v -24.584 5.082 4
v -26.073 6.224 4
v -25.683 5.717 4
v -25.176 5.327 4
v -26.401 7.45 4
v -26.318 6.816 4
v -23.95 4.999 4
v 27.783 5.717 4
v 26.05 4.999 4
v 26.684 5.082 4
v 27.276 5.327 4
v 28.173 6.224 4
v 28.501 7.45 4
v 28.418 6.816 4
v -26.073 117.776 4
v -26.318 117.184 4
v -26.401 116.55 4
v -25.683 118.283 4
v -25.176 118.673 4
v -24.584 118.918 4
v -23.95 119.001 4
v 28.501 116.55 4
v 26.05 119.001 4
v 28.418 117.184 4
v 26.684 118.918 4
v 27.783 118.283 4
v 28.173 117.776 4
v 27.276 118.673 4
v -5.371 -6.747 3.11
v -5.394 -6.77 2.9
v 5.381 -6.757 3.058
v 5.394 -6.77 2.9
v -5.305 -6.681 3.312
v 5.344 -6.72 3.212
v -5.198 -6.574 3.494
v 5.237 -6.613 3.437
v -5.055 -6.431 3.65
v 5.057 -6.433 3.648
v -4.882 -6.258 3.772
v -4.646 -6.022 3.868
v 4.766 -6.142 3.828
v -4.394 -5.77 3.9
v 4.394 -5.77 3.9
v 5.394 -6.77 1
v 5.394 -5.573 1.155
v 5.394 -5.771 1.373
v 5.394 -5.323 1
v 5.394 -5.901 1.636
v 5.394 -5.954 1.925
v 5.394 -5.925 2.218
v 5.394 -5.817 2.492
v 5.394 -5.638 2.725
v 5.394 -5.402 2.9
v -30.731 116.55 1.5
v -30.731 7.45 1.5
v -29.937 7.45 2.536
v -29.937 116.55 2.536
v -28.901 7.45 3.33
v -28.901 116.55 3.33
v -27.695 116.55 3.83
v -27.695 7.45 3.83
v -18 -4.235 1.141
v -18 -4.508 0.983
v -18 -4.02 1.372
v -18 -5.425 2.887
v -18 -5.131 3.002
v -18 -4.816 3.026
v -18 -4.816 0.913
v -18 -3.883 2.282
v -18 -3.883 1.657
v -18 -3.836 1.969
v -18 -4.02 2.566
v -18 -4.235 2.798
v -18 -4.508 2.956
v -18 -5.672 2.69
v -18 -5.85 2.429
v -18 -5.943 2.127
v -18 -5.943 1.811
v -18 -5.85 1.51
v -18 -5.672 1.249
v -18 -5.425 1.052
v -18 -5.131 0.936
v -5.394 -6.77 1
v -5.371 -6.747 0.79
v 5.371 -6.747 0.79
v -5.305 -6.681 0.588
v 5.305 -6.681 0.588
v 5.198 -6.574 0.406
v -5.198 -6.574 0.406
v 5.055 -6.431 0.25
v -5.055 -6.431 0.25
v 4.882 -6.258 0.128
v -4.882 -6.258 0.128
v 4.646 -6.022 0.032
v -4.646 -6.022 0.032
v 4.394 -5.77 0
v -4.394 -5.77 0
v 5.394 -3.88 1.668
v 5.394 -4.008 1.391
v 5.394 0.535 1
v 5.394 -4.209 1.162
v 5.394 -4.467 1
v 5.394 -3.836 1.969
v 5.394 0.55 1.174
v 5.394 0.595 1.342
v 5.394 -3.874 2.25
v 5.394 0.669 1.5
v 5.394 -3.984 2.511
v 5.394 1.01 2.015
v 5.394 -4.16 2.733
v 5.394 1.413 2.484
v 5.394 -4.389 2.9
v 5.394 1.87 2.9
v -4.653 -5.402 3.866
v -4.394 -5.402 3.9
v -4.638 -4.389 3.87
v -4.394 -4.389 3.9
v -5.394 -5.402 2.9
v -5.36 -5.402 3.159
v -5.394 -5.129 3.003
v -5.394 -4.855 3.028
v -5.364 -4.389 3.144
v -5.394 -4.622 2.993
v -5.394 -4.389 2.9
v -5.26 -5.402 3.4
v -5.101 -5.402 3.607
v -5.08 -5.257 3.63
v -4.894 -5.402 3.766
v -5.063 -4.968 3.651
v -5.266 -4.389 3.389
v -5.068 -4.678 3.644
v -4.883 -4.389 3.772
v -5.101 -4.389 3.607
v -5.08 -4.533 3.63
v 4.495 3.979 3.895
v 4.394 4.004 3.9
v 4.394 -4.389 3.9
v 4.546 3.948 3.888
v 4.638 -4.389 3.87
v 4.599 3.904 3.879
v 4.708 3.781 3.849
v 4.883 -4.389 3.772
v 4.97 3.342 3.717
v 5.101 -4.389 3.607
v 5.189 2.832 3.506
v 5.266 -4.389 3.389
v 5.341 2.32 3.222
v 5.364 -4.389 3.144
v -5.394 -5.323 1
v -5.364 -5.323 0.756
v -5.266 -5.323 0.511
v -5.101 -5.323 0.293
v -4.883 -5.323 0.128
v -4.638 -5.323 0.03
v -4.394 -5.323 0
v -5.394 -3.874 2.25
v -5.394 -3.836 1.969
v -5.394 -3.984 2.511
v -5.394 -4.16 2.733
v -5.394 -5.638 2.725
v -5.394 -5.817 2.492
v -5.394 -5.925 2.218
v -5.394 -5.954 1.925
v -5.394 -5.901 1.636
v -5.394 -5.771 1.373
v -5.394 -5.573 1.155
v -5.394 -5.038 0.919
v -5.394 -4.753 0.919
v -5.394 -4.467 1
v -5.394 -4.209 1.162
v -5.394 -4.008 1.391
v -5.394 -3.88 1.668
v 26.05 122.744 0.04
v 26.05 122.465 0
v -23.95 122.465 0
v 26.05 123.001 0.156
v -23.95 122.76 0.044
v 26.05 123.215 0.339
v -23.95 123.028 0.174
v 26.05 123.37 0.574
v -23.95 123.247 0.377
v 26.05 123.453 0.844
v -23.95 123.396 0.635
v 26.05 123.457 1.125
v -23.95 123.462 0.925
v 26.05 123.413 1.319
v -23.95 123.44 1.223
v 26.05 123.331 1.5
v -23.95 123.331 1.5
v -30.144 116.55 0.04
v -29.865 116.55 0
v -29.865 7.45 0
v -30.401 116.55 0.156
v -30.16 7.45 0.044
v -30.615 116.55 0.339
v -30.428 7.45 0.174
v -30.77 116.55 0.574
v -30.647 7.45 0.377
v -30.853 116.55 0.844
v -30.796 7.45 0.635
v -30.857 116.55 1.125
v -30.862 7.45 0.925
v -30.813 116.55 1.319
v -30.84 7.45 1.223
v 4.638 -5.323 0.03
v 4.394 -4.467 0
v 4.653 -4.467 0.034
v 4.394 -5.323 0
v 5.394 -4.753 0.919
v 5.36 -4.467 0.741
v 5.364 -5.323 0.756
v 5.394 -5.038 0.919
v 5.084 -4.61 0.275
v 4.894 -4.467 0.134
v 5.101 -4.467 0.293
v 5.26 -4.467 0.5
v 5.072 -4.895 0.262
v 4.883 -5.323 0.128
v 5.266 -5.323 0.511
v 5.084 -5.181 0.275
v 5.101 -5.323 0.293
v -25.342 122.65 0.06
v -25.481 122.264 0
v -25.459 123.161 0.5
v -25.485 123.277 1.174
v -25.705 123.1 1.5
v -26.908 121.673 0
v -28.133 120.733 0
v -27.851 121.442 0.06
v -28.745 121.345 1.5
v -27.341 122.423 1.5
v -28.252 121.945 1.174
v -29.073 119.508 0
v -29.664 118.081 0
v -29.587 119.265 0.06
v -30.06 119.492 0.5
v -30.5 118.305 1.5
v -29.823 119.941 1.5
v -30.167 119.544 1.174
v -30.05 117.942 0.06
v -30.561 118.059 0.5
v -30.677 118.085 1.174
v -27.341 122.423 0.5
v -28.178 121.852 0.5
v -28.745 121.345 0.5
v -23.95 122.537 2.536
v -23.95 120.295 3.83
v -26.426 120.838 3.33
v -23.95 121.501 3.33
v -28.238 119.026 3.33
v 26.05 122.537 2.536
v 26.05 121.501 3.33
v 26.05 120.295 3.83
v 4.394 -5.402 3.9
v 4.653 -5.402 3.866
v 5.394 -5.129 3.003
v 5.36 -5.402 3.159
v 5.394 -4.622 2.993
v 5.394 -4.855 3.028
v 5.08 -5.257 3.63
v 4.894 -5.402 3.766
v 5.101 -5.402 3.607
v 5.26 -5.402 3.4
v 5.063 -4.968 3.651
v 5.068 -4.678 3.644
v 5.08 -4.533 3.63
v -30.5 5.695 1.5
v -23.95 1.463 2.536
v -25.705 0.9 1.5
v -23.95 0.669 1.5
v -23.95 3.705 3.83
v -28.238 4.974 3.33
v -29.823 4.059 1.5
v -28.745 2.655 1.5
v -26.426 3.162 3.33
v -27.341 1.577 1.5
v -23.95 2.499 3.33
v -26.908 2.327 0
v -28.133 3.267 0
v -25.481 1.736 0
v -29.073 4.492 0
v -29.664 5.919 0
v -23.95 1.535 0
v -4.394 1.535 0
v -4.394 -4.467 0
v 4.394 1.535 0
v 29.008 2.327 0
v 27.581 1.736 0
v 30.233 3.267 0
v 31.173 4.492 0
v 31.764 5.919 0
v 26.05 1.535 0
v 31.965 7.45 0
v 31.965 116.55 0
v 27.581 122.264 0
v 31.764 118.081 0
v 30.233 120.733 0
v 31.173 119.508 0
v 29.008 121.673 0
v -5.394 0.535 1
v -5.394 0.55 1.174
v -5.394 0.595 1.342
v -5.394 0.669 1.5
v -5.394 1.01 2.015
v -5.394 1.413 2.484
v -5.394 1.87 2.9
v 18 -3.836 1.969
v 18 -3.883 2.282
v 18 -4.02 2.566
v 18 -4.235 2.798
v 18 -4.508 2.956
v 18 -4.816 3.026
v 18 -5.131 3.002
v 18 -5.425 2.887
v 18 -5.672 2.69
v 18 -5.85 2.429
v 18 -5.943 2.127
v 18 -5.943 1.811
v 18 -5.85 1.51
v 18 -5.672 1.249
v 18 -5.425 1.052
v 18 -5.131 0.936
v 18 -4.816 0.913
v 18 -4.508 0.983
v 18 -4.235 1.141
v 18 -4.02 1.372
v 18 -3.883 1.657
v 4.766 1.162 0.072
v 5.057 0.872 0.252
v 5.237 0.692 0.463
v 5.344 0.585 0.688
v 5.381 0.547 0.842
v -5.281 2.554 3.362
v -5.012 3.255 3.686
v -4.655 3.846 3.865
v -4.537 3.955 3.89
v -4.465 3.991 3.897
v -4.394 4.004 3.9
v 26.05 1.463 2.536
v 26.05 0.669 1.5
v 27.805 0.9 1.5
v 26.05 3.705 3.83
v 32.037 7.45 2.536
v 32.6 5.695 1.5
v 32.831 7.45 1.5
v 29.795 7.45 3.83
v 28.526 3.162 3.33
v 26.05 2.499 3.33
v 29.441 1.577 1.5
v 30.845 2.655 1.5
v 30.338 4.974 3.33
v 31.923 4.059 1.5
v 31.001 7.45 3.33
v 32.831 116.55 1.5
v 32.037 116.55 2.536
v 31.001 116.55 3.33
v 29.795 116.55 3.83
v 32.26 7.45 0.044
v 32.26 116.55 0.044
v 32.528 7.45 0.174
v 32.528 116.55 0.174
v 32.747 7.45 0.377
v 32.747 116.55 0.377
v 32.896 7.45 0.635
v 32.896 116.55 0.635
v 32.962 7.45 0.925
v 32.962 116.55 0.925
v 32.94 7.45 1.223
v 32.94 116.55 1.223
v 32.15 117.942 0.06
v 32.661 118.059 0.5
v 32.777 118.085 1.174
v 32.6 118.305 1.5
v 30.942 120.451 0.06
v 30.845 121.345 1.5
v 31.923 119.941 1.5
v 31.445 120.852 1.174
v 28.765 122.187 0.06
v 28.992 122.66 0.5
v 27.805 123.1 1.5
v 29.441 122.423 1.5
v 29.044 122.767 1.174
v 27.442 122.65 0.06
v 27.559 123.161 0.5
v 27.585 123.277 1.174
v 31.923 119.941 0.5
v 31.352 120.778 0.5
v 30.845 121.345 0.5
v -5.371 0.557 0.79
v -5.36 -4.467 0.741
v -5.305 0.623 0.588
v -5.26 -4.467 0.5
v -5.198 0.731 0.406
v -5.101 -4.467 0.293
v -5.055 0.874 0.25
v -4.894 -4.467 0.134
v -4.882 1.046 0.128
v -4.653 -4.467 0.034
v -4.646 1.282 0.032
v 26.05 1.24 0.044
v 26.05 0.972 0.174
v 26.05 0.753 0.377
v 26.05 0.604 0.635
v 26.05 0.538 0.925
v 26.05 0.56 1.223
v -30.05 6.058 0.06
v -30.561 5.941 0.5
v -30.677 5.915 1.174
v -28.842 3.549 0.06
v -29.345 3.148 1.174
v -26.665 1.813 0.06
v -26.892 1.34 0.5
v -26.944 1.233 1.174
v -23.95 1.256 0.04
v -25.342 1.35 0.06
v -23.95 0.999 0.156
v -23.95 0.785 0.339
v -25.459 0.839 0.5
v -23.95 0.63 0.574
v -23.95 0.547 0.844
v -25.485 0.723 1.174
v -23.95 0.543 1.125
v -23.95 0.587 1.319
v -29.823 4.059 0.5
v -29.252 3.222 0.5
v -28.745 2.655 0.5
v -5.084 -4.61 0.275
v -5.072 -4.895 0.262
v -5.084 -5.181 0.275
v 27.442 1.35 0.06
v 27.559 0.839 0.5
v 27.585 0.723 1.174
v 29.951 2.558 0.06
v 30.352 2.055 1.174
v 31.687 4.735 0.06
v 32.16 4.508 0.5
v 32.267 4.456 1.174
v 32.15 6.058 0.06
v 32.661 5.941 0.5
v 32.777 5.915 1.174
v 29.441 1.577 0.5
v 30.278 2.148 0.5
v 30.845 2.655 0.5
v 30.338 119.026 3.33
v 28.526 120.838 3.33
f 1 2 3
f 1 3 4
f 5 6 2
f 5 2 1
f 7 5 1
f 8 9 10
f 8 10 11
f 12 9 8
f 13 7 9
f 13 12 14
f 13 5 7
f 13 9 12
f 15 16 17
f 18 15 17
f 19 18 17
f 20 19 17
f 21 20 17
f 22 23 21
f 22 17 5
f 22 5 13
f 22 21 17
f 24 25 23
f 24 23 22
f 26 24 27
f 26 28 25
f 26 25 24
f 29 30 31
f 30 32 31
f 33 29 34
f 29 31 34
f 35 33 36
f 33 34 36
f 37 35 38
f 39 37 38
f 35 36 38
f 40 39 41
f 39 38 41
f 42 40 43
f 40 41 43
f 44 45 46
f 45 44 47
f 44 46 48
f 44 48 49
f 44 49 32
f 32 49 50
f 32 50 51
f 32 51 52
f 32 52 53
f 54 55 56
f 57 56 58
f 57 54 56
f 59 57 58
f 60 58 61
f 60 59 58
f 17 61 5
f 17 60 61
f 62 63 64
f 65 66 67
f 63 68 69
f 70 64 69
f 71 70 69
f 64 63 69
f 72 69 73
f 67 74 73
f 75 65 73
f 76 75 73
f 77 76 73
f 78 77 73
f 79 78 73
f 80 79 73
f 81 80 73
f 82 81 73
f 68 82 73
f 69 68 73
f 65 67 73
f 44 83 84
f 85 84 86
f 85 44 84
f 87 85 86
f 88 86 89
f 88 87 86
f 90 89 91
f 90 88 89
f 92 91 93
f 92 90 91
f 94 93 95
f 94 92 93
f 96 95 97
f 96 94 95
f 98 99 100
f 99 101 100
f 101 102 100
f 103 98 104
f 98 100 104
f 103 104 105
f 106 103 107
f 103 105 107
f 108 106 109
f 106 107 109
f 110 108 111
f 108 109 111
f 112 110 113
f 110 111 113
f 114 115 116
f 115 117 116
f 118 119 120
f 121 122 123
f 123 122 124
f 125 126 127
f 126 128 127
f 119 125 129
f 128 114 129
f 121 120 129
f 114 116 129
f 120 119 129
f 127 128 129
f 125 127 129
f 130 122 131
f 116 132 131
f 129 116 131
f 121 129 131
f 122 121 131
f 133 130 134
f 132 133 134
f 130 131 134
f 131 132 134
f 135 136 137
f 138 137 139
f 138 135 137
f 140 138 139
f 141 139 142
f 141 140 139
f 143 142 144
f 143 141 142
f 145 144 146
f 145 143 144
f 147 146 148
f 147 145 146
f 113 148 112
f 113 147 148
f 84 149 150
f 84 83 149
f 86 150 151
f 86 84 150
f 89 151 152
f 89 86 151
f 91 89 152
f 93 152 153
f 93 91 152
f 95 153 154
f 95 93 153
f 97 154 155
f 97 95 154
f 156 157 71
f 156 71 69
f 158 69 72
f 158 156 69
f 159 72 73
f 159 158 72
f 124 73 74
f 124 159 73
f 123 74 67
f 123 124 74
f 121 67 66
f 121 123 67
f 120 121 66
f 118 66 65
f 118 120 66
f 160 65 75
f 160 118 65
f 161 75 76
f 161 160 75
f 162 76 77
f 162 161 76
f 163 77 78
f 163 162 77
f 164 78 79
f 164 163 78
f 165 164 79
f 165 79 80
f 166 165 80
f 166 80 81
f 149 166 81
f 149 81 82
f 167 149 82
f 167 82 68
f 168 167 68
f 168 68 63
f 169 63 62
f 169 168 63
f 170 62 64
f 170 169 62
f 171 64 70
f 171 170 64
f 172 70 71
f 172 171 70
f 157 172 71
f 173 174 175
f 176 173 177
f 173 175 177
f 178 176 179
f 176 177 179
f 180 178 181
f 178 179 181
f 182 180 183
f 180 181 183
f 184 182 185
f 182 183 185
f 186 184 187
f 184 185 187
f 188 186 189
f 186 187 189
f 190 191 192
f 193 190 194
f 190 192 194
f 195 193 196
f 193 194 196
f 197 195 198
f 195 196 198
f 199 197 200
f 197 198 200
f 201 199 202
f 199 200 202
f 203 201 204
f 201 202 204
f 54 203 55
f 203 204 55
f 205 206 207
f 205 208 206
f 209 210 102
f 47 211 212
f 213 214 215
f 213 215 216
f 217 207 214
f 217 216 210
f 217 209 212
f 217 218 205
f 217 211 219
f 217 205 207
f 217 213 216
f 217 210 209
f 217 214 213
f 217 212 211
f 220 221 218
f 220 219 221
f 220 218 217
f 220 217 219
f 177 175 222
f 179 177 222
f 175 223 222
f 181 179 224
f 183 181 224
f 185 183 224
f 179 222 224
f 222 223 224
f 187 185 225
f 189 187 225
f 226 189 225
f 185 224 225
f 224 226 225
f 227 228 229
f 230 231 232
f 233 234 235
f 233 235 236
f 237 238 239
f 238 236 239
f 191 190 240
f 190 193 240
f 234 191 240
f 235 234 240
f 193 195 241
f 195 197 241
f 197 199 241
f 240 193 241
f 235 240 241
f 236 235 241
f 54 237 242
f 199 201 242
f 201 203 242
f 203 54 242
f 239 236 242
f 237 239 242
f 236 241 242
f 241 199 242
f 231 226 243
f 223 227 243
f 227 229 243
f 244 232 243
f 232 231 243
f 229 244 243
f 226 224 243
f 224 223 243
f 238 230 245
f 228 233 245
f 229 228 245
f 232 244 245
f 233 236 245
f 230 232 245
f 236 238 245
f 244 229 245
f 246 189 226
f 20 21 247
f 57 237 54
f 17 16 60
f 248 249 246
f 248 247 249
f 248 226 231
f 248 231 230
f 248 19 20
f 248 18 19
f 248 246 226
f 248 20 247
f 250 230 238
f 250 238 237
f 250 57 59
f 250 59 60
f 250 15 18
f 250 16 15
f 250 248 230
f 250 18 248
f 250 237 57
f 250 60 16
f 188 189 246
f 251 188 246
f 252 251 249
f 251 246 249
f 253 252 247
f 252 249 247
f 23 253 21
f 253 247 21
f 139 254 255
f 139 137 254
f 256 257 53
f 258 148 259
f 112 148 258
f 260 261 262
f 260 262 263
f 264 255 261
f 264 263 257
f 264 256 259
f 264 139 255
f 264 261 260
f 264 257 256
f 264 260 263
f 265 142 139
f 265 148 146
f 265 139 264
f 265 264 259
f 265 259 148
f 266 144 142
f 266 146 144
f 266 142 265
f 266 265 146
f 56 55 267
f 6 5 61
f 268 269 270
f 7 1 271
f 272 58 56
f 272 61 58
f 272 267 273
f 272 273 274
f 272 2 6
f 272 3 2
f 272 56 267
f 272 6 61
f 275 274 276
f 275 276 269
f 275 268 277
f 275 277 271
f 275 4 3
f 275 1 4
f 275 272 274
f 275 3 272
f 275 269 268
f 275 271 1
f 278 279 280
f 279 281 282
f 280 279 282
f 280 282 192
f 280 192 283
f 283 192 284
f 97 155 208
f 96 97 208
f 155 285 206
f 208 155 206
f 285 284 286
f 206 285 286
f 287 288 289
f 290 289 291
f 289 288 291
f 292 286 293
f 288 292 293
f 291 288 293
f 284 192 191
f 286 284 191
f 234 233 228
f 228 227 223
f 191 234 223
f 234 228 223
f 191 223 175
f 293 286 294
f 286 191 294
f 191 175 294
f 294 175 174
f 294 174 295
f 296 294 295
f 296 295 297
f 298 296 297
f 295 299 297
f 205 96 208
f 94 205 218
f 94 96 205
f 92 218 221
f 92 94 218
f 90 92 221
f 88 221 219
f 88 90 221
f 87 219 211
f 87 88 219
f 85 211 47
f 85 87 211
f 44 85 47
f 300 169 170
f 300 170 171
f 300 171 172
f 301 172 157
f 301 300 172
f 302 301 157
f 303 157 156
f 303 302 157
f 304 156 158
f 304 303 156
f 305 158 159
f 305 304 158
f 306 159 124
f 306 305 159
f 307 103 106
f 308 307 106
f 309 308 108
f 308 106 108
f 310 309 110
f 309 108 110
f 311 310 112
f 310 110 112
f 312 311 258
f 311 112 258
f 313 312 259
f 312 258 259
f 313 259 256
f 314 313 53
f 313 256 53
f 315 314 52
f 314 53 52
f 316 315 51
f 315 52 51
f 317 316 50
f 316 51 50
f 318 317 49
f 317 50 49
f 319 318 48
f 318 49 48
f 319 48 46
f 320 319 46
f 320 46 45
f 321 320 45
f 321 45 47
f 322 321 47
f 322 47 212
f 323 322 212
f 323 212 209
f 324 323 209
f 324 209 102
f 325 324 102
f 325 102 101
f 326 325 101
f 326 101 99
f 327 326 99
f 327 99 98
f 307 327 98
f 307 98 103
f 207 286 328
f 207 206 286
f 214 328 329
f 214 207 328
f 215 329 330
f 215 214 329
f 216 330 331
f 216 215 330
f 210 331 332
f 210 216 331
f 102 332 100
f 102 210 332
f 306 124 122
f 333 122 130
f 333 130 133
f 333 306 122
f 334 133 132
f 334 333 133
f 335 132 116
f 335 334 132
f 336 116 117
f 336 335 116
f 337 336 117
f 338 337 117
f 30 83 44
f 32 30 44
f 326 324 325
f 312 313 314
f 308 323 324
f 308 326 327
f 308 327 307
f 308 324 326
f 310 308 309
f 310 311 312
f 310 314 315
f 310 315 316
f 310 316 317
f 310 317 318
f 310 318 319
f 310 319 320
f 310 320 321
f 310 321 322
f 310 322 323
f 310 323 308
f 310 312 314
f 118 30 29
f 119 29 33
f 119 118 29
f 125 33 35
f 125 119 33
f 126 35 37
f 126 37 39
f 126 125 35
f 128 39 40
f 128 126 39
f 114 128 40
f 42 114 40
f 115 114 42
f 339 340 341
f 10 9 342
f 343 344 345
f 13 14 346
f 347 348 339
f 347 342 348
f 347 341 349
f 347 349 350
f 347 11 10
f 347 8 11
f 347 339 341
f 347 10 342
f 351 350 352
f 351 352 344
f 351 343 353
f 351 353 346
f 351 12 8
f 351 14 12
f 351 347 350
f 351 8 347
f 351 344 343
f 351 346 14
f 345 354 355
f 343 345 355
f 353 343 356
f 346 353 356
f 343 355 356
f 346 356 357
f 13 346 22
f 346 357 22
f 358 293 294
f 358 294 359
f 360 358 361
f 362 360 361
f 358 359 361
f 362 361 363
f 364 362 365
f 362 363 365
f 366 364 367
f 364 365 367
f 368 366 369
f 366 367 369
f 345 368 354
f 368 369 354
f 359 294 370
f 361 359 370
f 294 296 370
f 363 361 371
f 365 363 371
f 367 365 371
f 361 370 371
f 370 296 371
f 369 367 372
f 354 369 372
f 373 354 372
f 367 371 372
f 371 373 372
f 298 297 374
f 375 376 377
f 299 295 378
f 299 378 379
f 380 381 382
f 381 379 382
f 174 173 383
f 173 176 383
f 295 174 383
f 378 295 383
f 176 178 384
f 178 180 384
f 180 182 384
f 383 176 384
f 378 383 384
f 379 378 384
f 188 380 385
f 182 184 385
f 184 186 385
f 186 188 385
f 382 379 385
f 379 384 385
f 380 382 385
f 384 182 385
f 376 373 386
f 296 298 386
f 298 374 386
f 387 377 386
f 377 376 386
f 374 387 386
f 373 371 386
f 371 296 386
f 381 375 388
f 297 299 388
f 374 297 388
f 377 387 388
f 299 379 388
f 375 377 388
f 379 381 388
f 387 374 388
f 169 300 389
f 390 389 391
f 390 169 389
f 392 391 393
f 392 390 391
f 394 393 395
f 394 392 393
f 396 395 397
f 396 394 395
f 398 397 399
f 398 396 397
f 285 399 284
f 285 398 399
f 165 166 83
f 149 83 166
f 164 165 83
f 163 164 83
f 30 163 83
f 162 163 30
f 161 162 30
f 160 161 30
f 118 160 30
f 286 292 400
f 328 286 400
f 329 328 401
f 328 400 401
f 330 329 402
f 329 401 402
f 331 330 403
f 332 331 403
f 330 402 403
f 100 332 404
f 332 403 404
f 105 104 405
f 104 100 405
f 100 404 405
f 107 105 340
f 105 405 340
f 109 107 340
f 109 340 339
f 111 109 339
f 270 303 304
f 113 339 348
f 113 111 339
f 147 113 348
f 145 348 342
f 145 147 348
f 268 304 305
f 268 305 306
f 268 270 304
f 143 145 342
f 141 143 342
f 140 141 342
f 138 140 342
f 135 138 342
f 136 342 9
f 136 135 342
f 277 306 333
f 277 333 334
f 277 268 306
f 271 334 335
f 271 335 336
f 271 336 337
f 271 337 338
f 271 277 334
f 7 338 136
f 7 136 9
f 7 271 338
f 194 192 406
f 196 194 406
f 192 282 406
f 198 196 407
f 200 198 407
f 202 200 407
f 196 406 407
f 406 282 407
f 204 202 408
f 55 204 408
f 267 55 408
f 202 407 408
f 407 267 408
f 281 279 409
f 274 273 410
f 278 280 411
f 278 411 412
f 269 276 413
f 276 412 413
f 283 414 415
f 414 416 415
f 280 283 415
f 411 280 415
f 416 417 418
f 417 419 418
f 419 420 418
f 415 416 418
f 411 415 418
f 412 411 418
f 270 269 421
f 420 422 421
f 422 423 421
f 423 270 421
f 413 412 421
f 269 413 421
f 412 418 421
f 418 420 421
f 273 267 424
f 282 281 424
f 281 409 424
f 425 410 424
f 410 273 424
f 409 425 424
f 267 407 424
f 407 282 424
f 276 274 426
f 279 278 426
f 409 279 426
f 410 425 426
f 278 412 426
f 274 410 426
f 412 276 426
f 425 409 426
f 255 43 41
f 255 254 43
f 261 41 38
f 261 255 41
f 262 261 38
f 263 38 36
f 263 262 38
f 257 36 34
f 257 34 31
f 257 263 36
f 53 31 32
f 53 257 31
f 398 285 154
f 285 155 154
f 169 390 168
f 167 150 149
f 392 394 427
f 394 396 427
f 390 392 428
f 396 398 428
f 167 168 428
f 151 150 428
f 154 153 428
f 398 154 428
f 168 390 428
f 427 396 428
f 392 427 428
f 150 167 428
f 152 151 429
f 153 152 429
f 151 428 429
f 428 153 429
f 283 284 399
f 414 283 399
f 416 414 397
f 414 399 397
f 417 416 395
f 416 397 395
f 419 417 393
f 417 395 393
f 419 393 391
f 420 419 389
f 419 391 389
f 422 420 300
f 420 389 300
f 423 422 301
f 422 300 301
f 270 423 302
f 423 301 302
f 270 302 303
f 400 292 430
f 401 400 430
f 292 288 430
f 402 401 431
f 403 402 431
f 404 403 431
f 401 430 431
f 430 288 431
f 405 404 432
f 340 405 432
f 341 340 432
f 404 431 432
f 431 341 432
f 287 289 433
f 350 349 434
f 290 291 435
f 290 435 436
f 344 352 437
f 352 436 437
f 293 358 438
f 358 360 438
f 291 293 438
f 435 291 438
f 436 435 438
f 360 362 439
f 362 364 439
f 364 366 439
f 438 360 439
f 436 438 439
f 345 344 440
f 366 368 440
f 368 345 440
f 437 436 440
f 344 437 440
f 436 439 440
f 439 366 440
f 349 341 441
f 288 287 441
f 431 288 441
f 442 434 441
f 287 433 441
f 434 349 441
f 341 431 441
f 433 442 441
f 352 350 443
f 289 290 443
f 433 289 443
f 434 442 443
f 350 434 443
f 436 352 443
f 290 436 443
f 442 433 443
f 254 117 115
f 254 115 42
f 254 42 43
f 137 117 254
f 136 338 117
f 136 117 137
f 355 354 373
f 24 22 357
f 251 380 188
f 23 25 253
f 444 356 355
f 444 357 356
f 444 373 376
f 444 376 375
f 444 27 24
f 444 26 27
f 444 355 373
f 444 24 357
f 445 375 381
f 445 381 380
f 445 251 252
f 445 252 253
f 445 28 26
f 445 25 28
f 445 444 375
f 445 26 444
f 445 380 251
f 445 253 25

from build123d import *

# Parameters (mm, degrees)
F1_DEPTH     = 4
F2_T1_DEPTH  = 109.1
F2_T3_DEPTH  = 50
F2_T6_ANGLE  = 90
F2_T8_ANGLE  = 90
F2_T10_ANGLE = 90
F2_T12_ANGLE = 90
F3_R         = 1
F4_W         = 10.7876481488
F4_H         = 3.5392509308
F5_DEPTH     = 3.9
F6_DEPTH     = 4.8
F7_DEPTH     = 5
F8_R         = 1.0596630805
F9_DEPTH     = 18
F10_DEPTH    = 18
F11_R        = 1


# Not quite as in the source:
# - a fillet or chamfer that OpenCascade refuses, or shapes differently, is made with other operations: its cross-section is extruded or revolved along the edge and cut away or added


with BuildPart() as f1:
    # F0 (on Top) → F1 (new body)
    with BuildSketch(Plane.XY):
        with BuildLine():
            Line((26.0500038445, 123.900002712), (-23.9499961555, 123.900002712))
            ThreePointArc((-23.9499961555, 123.900002712), (-29.1472309972, 121.7472375537), (-31.2999961555, 116.550002712))
            Line((-31.2999961555, 116.550002712), (-31.2999961555, 7.450002712))
            ThreePointArc((-31.2999961555, 7.450002712), (-29.1472309972, 2.2527678703), (-23.9499961555, 0.100002712))
            Line((-23.9499961555, 0.100002712), (26.0500038445, 0.100002712))
            ThreePointArc((26.0500038445, 0.100002712), (31.2472386862, 2.2527678703), (33.4000038445, 7.450002712))
            Line((33.4000038445, 7.450002712), (33.4000038445, 116.550002712))
            ThreePointArc((33.4000038445, 116.550002712), (31.2472386862, 121.7472375537), (26.0500038445, 123.900002712))
        make_face()
    extrude(amount=F1_DEPTH)

    # F2: fillet of radius 5 on 1 edges, made by hand

    # F2_s2 → F2_t1 (cut)
    with BuildSketch(Plane.XZ.offset(-116.550002712)):
        with BuildLine():
            ThreePointArc((33.4000038445, 0), (31.6633020191, 2.8729833462), (28.5010243589, 4))
            Line((28.5010243589, 4), (28.5010243589, 4.1))
            Line((28.5010243589, 4.1), (33.4000038445, 4.1))
            Line((33.4000038445, 4.1), (33.5000038445, 4))
            ThreePointArc((33.5000038445, 4), (33.5000038445, 2), (33.4979834342, 0.02))
            Line((33.4979834342, 0.02), (33.4000038445, 0))
        make_face()
        with BuildLine():
            ThreePointArc((-31.2999961555, 0), (-29.5632943301, 2.8729833462), (-26.4010166699, 4))
            Line((-26.4010166699, 4), (-26.4010166699, 4.1))
            Line((-26.4010166699, 4.1), (-31.2999961555, 4.1))
            Line((-31.2999961555, 4.1), (-31.3999961555, 4))
            ThreePointArc((-31.3999961555, 4), (-31.3999961555, 2), (-31.3979757452, 0.02))
            Line((-31.3979757452, 0.02), (-31.2999961555, 0))
        make_face()
    extrude(amount=F2_T1_DEPTH, mode=Mode.SUBTRACT)

    # F2_s4 → F2_t3 (cut)
    with BuildSketch(Plane.YZ.offset(-23.9499961555)):
        with BuildLine():
            ThreePointArc((123.900002712, 0), (122.1633008866, 2.8729833462), (119.0010232264, 4))
            Line((119.0010232264, 4), (119.0010232264, 4.1))
            Line((119.0010232264, 4.1), (123.900002712, 4.1))
            Line((123.900002712, 4.1), (124.000002712, 4))
            ThreePointArc((124.000002712, 4), (124.000002712, 2), (123.9979823017, 0.02))
            Line((123.9979823017, 0.02), (123.900002712, 0))
        make_face()
        with BuildLine():
            ThreePointArc((0.100002712, 0), (1.8367045374, 2.8729833462), (4.9989821976, 4))
            Line((4.9989821976, 4), (4.9989821976, 4.1))
            Line((4.9989821976, 4.1), (0.100002712, 4.1))
            Line((0.100002712, 4.1), (2.712e-06, 4))
            ThreePointArc((2.712e-06, 4), (2.712e-06, 2), (0.0020231223, 0.02))
            Line((0.0020231223, 0.02), (0.100002712, 0))
        make_face()
    extrude(amount=F2_T3_DEPTH, mode=Mode.SUBTRACT)

    # F2_s5 → F2_t6 (revolve, cut)
    with BuildSketch(Plane.YZ.offset(26.0500038445)):
        with BuildLine():
            ThreePointArc((0.100002712, 0), (1.8367045374, 2.8729833462), (4.9989821976, 4))
            Line((4.9989821976, 4), (4.9989821976, 4.1))
            Line((4.9989821976, 4.1), (0.100002712, 4.1))
            Line((0.100002712, 4.1), (2.712e-06, 4))
            ThreePointArc((2.712e-06, 4), (2.712e-06, 2), (0.0020231223, 0.02))
            Line((0.0020231223, 0.02), (0.100002712, 0))
        make_face()
    revolve(axis=Axis((26.0500038445, 7.450002712, 4), (0, 0, 1)), revolution_arc=F2_T6_ANGLE, mode=Mode.SUBTRACT)

    # F2_s7 → F2_t8 (revolve, cut)
    with BuildSketch(Plane.XZ.offset(-116.550002712)):
        with BuildLine():
            ThreePointArc((33.4000038445, 0), (31.6633020191, 2.8729833462), (28.5010243589, 4))
            Line((28.5010243589, 4), (28.5010243589, 4.1))
            Line((28.5010243589, 4.1), (33.4000038445, 4.1))
            Line((33.4000038445, 4.1), (33.5000038445, 4))
            ThreePointArc((33.5000038445, 4), (33.5000038445, 2), (33.4979834342, 0.02))
            Line((33.4979834342, 0.02), (33.4000038445, 0))
        make_face()
    revolve(axis=Axis((26.0500038445, 116.550002712, 4), (0, 0, 1)), revolution_arc=F2_T8_ANGLE, mode=Mode.SUBTRACT)

    # F2_s9 → F2_t10 (revolve, cut)
    with BuildSketch(Plane.YZ.offset(-23.9499961555)):
        with BuildLine():
            ThreePointArc((123.900002712, 0), (122.1633008866, 2.8729833462), (119.0010232264, 4))
            Line((119.0010232264, 4), (119.0010232264, 4.1))
            Line((119.0010232264, 4.1), (123.900002712, 4.1))
            Line((123.900002712, 4.1), (124.000002712, 4))
            ThreePointArc((124.000002712, 4), (124.000002712, 2), (123.9979823017, 0.02))
            Line((123.9979823017, 0.02), (123.900002712, 0))
        make_face()
    revolve(axis=Axis((-23.9499961555, 116.550002712, 4), (0, 0, 1)), revolution_arc=F2_T10_ANGLE, mode=Mode.SUBTRACT)

    # F2_s11 → F2_t12 (revolve, cut)
    with BuildSketch(Plane.XZ.offset(-7.450002712)):
        with BuildLine():
            ThreePointArc((-31.2999961555, 0), (-29.5632943301, 2.8729833462), (-26.4010166699, 4))
            Line((-26.4010166699, 4), (-26.4010166699, 4.1))
            Line((-26.4010166699, 4.1), (-31.2999961555, 4.1))
            Line((-31.2999961555, 4.1), (-31.3999961555, 4))
            ThreePointArc((-31.3999961555, 4), (-31.3999961555, 2), (-31.3979757452, 0.02))
            Line((-31.3979757452, 0.02), (-31.2999961555, 0))
        make_face()
    revolve(axis=Axis((-23.9499961555, 7.450002712, 4), (0, 0, 1)), revolution_arc=F2_T12_ANGLE, mode=Mode.SUBTRACT)

    # F3
    f3_edges = [f1.edges().sort_by_distance(p)[0] for p in [
        (33.400004, 62.000003, 0),
        (31.247239, 121.747238, 0),
        (1.050004, 123.900003, 0),
        (-29.147231, 121.747238, 0),
        (-31.299996, 62.000003, 0),
        (-29.147231, 2.252768, 0),
        (1.050004, 0.100003, 0),
        (31.247239, 2.252768, 0),
    ]]
    fillet(f3_edges, radius=F3_R)

    # F4 (on Top) → F5 (join)
    with BuildSketch(Plane.XY):
        Rectangle(F4_W, F4_H)
    extrude(amount=F5_DEPTH)

    # F6 (add): a face of the model
    f6_faces = [f1.faces().sort_by_distance(p)[0] for p in [
        (0, 1.7696254654, 3.3586156696),
    ]]
    extrude(f6_faces, amount=F6_DEPTH)

    # F7 (add): a face of the model
    f7_faces = [f1.faces().sort_by_distance(p)[0] for p in [
        (0, -1.7696254654, 1.95),
    ]]
    extrude(f7_faces, amount=F7_DEPTH)

    # F8 (on Right) → F9 (join)
    with BuildSketch(Plane.YZ):
        with Locations((-4.8954286613, 1.9693823997)):
            Circle(F8_R)
    extrude(amount=F9_DEPTH)

    # F8 (on Right) → F10 (join)
    with BuildSketch(Plane.YZ):
        with Locations((-4.8954286613, 1.9693823997)):
            Circle(F8_R)
    extrude(amount=-F10_DEPTH)

    # F11
    f11_edges = [f1.edges().sort_by_distance(p)[0] for p in [
        (5.393824, -1.382815, 3.9),
        (-5.393824, -1.382815, 3.9),
        (0, -6.769625, 3.9),
        (0, -6.769625, 0),
        (5.393824, -2.617372, 0),
        (-5.393824, -2.617372, 0),
    ]]
    fillet(f11_edges, radius=F11_R)


solid = f1.part
